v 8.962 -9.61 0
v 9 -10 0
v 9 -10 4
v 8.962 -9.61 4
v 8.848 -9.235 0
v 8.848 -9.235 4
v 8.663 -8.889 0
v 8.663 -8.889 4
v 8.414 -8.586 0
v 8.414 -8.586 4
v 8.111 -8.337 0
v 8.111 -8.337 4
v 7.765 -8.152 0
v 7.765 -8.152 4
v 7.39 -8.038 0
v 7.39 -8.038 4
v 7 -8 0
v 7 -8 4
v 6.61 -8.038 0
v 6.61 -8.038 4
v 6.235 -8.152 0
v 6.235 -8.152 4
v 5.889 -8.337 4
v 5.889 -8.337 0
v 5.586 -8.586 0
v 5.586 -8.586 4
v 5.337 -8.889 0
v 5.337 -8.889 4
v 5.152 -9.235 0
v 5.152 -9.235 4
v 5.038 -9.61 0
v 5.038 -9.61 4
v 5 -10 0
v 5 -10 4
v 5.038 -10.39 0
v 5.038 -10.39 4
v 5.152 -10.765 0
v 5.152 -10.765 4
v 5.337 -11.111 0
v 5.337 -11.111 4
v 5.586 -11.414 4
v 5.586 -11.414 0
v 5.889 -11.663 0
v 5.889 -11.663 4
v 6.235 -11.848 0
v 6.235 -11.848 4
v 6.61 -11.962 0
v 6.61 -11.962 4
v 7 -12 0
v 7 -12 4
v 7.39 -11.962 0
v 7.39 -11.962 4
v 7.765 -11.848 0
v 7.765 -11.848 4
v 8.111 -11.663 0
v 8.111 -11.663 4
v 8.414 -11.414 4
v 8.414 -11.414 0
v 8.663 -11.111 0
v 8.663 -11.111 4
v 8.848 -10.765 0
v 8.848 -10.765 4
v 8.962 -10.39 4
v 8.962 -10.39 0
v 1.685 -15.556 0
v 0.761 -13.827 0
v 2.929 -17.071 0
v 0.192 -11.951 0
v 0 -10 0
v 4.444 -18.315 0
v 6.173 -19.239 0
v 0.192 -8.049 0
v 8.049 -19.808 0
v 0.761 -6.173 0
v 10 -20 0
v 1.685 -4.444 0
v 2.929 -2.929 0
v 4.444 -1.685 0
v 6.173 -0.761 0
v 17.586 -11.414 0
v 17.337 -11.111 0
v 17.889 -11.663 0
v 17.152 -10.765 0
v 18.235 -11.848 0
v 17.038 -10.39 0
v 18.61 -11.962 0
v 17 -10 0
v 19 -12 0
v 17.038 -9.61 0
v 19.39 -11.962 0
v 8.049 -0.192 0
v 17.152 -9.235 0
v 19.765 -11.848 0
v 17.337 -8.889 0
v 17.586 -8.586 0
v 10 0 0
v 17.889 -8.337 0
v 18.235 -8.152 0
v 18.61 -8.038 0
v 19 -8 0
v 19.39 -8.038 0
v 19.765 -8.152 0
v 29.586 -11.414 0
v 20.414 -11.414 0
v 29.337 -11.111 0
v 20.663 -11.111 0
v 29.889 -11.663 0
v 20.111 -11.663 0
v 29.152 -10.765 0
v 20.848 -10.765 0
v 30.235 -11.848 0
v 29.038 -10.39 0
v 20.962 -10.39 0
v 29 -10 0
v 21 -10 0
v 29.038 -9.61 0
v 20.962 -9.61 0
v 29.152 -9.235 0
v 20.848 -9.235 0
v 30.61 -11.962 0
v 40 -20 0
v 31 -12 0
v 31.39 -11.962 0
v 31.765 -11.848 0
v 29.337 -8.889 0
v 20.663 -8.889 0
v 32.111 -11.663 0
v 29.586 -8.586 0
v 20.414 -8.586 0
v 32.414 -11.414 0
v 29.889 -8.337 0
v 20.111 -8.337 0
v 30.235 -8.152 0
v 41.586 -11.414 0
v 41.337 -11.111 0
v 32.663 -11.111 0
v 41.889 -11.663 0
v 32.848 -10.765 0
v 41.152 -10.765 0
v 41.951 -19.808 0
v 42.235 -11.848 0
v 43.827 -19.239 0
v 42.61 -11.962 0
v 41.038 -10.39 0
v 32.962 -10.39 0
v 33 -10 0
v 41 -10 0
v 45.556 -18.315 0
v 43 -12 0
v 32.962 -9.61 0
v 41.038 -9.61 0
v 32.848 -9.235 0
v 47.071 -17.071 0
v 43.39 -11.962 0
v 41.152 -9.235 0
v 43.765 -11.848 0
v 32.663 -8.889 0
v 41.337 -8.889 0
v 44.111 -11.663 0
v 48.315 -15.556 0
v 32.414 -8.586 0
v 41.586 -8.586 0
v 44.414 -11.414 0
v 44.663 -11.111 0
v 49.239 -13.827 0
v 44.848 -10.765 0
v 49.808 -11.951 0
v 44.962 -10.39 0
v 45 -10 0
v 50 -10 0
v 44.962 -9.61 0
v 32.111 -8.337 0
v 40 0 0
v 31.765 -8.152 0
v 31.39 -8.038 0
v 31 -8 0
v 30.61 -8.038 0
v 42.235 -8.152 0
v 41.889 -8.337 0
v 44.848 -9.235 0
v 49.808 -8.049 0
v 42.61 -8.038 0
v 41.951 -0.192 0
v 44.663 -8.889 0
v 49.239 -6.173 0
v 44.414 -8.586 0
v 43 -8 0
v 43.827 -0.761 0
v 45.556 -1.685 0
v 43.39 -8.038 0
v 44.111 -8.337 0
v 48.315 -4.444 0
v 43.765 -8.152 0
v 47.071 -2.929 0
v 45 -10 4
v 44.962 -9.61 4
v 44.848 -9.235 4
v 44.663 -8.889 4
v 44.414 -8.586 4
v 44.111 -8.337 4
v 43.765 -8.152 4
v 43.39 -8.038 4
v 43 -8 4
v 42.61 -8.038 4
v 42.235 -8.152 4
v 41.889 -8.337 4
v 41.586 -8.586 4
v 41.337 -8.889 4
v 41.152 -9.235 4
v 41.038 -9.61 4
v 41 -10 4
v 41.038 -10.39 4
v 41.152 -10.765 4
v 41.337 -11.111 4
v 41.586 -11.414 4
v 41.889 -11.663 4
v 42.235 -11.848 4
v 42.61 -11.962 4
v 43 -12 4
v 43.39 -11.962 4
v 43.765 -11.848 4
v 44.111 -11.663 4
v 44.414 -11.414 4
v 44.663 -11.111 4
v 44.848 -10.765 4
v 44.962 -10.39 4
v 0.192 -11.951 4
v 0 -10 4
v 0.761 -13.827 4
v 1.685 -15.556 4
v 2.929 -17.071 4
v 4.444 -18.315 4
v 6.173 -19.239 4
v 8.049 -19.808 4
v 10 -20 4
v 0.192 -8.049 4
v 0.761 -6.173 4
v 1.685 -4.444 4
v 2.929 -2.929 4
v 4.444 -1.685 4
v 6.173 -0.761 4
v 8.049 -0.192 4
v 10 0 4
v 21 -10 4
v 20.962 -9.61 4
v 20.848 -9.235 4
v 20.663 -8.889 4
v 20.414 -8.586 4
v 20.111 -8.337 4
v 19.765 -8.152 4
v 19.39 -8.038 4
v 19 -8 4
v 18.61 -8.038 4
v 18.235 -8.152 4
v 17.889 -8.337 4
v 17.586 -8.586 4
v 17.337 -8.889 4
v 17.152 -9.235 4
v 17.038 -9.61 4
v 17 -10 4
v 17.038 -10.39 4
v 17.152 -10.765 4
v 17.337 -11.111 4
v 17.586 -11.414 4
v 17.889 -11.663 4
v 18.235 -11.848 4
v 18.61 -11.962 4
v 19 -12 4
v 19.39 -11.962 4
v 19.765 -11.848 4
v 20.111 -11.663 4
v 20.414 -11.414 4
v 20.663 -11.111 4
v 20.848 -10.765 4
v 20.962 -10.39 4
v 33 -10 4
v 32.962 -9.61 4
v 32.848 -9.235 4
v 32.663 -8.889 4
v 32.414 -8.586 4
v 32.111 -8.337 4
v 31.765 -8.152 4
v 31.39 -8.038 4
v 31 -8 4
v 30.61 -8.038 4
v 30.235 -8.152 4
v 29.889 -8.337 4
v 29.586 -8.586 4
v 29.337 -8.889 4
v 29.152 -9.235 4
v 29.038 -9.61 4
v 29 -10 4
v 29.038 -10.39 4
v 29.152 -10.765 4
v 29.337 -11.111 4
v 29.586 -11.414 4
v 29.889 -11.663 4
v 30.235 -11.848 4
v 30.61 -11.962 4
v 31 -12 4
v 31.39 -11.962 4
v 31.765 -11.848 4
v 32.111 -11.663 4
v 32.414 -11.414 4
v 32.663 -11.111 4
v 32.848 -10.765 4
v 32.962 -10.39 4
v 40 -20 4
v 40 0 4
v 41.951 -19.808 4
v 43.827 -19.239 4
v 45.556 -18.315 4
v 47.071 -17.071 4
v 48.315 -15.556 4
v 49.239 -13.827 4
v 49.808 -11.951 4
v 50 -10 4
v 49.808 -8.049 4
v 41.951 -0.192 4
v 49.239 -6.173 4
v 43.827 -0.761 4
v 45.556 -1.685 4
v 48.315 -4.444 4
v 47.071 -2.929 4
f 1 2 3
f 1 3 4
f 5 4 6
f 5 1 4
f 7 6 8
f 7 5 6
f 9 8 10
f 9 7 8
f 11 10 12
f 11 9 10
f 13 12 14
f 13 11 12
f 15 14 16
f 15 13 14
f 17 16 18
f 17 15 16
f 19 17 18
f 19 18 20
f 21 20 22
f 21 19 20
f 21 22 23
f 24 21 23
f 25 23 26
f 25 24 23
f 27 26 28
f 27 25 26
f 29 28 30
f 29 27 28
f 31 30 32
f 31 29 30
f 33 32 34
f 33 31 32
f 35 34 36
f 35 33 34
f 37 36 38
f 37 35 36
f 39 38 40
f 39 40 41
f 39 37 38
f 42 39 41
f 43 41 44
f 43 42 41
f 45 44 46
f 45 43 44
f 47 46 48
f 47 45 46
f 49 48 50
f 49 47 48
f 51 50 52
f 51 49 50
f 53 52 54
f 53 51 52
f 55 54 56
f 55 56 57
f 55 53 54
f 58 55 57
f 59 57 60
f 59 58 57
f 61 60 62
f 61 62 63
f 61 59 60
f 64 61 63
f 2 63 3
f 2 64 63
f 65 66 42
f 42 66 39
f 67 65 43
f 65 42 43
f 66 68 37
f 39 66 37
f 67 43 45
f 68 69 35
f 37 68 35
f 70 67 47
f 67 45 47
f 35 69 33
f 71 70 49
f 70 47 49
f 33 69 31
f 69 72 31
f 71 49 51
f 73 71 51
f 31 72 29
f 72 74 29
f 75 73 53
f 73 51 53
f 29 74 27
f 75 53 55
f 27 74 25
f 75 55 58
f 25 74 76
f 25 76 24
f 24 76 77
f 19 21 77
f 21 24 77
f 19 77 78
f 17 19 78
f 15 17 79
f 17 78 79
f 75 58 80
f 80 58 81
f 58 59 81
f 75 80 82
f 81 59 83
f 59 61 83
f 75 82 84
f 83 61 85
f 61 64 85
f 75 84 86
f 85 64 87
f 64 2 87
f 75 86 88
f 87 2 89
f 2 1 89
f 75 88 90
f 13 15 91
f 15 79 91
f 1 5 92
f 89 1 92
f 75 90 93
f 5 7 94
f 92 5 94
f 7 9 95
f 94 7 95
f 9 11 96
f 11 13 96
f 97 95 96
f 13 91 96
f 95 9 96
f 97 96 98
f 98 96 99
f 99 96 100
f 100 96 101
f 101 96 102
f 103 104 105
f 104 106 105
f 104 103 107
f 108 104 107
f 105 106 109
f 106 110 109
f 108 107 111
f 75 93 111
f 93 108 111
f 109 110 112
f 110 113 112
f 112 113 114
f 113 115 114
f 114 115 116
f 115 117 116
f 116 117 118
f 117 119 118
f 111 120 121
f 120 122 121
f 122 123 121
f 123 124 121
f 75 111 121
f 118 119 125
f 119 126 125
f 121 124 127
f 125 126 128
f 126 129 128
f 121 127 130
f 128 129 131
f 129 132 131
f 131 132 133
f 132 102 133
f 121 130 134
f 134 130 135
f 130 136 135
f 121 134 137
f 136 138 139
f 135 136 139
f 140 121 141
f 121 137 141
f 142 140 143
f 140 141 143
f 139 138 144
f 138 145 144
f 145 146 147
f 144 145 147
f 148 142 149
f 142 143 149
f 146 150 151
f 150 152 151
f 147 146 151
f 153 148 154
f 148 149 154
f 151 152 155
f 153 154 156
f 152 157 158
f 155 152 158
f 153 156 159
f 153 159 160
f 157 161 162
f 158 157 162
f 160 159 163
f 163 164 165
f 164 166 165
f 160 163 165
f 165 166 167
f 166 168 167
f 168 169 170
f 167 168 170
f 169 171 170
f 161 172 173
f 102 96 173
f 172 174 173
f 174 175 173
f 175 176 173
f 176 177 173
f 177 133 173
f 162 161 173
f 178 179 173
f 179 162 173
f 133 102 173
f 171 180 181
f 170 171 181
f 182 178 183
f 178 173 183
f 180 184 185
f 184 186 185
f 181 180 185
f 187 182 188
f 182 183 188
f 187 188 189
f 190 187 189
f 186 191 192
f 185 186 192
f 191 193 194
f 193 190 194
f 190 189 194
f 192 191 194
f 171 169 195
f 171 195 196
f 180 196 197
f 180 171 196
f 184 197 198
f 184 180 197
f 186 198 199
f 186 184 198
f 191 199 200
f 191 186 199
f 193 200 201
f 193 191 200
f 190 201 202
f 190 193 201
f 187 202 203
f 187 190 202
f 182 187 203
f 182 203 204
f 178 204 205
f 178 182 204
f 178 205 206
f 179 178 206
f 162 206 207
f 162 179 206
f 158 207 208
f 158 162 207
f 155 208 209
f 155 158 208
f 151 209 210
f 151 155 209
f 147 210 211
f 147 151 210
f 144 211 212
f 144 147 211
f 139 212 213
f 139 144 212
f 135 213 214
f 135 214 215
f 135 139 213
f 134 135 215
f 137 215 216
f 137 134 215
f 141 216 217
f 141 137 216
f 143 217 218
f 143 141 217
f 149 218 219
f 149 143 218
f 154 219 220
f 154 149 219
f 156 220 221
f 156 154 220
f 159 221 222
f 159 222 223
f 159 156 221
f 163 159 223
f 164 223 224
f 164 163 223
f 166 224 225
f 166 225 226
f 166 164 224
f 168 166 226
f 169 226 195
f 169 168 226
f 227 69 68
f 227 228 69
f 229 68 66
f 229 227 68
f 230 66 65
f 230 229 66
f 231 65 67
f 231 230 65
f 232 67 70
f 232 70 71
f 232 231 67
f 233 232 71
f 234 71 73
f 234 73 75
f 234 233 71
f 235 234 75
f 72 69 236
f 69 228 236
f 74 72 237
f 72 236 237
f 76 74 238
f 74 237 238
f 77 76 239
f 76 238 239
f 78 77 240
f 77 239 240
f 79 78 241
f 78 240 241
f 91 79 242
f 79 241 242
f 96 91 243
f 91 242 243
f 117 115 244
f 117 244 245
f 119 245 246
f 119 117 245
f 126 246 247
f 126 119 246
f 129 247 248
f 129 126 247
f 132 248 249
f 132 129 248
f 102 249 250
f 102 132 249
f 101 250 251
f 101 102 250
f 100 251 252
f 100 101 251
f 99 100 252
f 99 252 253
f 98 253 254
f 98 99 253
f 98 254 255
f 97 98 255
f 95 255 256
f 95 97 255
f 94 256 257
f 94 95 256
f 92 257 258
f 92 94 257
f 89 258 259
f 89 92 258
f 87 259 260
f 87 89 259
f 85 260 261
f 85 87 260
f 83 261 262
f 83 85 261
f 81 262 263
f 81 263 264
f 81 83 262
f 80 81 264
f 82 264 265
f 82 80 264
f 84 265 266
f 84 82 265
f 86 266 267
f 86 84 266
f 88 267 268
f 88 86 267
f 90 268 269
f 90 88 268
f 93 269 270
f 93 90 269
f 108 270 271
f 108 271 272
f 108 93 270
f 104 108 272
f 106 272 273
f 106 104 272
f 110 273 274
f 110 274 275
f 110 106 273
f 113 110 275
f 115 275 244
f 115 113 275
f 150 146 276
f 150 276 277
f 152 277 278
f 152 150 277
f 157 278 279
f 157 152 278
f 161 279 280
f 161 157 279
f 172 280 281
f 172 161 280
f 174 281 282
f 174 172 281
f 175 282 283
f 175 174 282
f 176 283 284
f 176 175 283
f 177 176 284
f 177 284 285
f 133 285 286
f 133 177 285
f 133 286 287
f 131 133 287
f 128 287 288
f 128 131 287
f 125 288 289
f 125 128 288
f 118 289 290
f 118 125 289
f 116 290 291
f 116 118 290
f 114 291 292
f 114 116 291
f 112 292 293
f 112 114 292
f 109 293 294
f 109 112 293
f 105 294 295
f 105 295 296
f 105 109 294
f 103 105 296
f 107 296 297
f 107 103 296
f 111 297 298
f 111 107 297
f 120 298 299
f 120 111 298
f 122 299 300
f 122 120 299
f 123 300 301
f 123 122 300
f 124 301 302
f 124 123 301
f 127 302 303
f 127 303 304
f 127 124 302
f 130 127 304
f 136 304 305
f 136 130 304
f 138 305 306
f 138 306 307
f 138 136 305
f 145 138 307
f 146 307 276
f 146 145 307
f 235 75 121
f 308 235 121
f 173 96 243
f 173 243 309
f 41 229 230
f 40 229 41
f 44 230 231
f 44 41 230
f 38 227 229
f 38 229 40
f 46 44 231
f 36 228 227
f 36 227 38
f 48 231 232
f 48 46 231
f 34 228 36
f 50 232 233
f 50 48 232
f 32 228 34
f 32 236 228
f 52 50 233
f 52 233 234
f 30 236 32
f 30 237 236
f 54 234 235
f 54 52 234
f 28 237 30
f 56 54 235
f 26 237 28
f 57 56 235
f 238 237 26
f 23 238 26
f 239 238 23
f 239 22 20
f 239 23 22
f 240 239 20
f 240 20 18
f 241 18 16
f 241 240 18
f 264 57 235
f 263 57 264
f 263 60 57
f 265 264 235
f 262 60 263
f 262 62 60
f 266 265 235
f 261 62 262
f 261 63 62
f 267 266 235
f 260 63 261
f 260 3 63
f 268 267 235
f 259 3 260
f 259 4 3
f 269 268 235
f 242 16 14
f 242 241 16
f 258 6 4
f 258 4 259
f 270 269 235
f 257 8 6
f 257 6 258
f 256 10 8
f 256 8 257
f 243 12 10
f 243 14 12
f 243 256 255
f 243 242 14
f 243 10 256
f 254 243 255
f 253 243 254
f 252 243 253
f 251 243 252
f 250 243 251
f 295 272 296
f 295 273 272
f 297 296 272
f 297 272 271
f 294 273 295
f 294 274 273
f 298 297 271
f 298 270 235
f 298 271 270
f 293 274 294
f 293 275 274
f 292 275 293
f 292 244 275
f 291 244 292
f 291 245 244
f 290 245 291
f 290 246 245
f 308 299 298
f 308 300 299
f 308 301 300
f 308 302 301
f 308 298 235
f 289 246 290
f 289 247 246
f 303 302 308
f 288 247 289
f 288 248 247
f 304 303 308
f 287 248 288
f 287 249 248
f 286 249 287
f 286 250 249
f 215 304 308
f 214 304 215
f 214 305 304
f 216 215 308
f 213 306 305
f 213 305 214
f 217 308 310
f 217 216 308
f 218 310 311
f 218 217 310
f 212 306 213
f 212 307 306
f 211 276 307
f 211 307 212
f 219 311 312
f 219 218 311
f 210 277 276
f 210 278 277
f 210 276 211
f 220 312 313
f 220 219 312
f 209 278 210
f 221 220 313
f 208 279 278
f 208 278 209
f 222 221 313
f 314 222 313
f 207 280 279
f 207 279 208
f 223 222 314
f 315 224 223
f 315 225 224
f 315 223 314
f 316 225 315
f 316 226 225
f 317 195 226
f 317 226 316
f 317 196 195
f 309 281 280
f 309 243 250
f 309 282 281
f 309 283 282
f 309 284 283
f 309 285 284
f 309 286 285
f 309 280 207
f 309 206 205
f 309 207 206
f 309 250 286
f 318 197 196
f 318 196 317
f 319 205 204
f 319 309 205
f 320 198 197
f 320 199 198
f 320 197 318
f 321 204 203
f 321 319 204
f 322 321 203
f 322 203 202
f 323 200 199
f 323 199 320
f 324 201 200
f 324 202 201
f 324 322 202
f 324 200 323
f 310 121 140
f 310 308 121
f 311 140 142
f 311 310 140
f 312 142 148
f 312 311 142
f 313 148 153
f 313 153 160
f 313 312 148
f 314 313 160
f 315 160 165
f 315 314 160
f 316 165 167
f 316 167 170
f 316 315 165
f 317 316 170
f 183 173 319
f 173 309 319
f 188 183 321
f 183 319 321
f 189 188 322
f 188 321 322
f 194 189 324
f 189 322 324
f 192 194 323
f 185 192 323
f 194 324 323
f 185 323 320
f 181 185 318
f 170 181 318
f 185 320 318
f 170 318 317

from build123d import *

# Parameters (mm, degrees)
SKETCH_1_W      = 50
SKETCH_1_H      = 20
SKETCH_1_R      = 2
EXTRUDE_1_DEPTH = 4
FILLET_1_R      = 10


with BuildPart() as part:
    # 草图1 → 凸台-拉伸1 (new body)
    with BuildSketch(Plane.XY):
        with Locations((25, -10)):
            Rectangle(SKETCH_1_W, SKETCH_1_H)
        with Locations((7, -10)):
            Circle(SKETCH_1_R, mode=Mode.SUBTRACT)
        with Locations((19, -10)):
            Circle(SKETCH_1_R, mode=Mode.SUBTRACT)
        with Locations((31, -10)):
            Circle(SKETCH_1_R, mode=Mode.SUBTRACT)
        with Locations((43, -10)):
            Circle(SKETCH_1_R, mode=Mode.SUBTRACT)
    extrude(amount=EXTRUDE_1_DEPTH)

    # 圆角1
    fillet_1_edges = [part.edges().sort_by_distance(p)[0] for p in [
        (50, 0, 2),
        (50, -20, 2),
        (0, -20, 2),
        (0, 0, 2),
    ]]
    fillet(fillet_1_edges, radius=FILLET_1_R - 0.0001)  # a hair under: the kernel refuses the full size


solid = part.part
